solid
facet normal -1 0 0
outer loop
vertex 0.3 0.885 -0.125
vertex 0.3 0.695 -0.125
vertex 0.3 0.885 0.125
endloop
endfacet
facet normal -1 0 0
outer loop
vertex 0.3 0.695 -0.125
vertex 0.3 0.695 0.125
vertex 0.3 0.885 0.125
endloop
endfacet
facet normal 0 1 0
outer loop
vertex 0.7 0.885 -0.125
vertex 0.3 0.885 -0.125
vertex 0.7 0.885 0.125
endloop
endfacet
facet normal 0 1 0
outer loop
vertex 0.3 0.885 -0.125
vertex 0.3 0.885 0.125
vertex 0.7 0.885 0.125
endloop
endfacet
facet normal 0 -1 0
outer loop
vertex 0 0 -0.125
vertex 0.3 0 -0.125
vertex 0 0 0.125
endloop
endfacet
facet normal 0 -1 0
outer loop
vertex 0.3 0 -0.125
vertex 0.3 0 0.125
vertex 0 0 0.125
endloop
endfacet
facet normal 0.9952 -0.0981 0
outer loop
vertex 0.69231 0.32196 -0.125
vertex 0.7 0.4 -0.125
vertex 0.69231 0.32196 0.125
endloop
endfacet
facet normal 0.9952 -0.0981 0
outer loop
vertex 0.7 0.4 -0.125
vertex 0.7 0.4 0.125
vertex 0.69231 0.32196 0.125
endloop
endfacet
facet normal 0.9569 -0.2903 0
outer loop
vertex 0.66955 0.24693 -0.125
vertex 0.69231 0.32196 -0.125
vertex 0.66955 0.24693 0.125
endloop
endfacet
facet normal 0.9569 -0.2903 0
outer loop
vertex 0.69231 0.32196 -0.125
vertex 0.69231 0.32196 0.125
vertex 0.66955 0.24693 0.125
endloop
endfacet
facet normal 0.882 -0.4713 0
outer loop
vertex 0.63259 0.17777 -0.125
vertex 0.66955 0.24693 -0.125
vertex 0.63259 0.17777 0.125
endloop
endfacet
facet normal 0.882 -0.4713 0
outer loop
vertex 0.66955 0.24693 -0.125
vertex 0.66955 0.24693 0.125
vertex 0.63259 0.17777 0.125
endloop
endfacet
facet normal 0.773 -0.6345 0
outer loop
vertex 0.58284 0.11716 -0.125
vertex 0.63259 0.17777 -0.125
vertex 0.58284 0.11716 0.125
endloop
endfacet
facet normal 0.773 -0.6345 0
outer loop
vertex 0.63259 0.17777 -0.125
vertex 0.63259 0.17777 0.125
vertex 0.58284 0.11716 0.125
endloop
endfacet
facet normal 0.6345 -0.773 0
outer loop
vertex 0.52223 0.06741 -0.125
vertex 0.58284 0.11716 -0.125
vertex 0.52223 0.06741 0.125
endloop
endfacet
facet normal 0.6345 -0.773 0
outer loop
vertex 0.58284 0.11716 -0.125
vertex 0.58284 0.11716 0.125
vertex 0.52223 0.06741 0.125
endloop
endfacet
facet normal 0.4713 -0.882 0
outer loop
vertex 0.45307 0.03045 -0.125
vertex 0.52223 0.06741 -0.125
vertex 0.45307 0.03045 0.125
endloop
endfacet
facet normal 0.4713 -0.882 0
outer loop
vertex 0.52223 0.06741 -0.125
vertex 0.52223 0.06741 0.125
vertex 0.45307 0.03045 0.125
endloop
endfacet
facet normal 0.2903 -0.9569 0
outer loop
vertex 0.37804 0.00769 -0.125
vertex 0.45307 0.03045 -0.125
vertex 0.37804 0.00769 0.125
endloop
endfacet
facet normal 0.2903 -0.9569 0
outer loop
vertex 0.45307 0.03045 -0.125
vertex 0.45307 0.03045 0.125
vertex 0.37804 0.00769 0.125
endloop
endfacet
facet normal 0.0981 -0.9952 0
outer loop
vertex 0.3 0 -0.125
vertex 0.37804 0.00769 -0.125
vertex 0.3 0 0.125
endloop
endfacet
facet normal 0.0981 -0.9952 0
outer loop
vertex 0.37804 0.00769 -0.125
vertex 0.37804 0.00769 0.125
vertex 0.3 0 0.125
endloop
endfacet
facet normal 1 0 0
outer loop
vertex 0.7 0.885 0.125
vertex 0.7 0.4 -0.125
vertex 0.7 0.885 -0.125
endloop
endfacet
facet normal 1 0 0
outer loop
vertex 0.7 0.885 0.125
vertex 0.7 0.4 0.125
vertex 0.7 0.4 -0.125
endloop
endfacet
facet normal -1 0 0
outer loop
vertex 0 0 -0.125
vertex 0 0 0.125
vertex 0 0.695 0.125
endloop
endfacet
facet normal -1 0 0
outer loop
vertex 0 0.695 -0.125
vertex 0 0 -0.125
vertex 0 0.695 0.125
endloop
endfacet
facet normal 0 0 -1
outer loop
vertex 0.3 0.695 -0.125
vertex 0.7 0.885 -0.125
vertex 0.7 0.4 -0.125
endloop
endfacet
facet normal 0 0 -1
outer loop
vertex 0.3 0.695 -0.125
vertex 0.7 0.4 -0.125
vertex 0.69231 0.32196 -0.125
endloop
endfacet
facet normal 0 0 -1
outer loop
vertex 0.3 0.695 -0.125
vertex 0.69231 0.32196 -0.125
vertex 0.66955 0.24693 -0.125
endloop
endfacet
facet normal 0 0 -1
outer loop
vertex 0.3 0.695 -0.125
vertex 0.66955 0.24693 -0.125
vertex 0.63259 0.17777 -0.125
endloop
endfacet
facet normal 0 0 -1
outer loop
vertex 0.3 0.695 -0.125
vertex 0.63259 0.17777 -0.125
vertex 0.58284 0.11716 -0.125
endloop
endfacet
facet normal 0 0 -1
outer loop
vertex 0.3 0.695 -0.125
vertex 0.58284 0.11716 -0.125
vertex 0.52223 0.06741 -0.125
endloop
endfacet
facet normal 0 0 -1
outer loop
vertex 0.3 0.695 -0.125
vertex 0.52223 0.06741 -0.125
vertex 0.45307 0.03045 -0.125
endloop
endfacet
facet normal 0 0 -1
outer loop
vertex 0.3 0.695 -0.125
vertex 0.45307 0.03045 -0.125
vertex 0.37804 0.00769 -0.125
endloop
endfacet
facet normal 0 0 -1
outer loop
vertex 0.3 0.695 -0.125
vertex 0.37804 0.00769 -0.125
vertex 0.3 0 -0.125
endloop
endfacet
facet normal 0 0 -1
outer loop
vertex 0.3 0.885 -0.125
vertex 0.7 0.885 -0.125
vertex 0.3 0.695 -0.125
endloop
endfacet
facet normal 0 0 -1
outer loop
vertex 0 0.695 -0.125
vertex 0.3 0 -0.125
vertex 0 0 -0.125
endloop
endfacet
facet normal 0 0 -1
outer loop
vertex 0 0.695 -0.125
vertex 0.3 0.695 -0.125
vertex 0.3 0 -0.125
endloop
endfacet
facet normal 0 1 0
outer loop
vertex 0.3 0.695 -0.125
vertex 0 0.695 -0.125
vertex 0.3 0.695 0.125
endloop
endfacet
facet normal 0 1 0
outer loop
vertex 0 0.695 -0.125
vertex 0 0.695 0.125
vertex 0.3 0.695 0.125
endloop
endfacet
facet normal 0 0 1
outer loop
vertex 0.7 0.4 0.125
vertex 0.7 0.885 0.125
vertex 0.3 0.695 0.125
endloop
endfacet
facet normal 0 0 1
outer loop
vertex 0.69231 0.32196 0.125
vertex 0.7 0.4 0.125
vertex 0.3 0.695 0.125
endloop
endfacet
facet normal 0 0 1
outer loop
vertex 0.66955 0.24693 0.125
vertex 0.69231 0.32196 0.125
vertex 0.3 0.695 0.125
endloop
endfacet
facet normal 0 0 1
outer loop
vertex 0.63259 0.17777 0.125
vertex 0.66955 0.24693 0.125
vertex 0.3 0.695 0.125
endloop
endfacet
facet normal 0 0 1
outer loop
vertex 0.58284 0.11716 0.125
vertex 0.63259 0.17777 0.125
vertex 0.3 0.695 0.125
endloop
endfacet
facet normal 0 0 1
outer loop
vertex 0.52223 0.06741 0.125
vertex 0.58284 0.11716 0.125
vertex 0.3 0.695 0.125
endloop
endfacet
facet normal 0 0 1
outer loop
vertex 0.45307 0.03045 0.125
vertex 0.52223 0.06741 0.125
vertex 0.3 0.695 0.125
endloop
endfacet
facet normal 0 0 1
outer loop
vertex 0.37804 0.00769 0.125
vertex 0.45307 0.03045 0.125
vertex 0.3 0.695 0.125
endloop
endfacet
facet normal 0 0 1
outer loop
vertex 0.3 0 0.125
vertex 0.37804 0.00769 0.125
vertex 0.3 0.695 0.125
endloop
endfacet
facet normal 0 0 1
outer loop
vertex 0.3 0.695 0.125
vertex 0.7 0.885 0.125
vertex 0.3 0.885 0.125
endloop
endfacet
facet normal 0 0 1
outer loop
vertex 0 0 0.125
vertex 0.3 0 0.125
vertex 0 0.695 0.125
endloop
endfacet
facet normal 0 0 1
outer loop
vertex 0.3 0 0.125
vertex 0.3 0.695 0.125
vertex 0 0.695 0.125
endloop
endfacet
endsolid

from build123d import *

# Parameters (mm, degrees)
BOSS_EXTRUDE1_DEPTH = 0.125
FILLET1_R           = 0.4


with BuildPart() as part:
    # frame_outline → Boss-Extrude1 (new, symmetric)
    with BuildSketch(Plane.XY):
        Polygon((0, 0), (0, 0.695), (0.3, 0.695), (0.3, 0.885), (0.7, 0.885), (0.7, 0.695), (0.7, 0), align=None)
    extrude(amount=BOSS_EXTRUDE1_DEPTH, both=True)

    # Fillet1
    fillet1_edges = [part.edges().sort_by_distance(p)[0] for p in [
        (0.7, 0, 0),
    ]]
    fillet(fillet1_edges, radius=FILLET1_R)


solid = part.part
